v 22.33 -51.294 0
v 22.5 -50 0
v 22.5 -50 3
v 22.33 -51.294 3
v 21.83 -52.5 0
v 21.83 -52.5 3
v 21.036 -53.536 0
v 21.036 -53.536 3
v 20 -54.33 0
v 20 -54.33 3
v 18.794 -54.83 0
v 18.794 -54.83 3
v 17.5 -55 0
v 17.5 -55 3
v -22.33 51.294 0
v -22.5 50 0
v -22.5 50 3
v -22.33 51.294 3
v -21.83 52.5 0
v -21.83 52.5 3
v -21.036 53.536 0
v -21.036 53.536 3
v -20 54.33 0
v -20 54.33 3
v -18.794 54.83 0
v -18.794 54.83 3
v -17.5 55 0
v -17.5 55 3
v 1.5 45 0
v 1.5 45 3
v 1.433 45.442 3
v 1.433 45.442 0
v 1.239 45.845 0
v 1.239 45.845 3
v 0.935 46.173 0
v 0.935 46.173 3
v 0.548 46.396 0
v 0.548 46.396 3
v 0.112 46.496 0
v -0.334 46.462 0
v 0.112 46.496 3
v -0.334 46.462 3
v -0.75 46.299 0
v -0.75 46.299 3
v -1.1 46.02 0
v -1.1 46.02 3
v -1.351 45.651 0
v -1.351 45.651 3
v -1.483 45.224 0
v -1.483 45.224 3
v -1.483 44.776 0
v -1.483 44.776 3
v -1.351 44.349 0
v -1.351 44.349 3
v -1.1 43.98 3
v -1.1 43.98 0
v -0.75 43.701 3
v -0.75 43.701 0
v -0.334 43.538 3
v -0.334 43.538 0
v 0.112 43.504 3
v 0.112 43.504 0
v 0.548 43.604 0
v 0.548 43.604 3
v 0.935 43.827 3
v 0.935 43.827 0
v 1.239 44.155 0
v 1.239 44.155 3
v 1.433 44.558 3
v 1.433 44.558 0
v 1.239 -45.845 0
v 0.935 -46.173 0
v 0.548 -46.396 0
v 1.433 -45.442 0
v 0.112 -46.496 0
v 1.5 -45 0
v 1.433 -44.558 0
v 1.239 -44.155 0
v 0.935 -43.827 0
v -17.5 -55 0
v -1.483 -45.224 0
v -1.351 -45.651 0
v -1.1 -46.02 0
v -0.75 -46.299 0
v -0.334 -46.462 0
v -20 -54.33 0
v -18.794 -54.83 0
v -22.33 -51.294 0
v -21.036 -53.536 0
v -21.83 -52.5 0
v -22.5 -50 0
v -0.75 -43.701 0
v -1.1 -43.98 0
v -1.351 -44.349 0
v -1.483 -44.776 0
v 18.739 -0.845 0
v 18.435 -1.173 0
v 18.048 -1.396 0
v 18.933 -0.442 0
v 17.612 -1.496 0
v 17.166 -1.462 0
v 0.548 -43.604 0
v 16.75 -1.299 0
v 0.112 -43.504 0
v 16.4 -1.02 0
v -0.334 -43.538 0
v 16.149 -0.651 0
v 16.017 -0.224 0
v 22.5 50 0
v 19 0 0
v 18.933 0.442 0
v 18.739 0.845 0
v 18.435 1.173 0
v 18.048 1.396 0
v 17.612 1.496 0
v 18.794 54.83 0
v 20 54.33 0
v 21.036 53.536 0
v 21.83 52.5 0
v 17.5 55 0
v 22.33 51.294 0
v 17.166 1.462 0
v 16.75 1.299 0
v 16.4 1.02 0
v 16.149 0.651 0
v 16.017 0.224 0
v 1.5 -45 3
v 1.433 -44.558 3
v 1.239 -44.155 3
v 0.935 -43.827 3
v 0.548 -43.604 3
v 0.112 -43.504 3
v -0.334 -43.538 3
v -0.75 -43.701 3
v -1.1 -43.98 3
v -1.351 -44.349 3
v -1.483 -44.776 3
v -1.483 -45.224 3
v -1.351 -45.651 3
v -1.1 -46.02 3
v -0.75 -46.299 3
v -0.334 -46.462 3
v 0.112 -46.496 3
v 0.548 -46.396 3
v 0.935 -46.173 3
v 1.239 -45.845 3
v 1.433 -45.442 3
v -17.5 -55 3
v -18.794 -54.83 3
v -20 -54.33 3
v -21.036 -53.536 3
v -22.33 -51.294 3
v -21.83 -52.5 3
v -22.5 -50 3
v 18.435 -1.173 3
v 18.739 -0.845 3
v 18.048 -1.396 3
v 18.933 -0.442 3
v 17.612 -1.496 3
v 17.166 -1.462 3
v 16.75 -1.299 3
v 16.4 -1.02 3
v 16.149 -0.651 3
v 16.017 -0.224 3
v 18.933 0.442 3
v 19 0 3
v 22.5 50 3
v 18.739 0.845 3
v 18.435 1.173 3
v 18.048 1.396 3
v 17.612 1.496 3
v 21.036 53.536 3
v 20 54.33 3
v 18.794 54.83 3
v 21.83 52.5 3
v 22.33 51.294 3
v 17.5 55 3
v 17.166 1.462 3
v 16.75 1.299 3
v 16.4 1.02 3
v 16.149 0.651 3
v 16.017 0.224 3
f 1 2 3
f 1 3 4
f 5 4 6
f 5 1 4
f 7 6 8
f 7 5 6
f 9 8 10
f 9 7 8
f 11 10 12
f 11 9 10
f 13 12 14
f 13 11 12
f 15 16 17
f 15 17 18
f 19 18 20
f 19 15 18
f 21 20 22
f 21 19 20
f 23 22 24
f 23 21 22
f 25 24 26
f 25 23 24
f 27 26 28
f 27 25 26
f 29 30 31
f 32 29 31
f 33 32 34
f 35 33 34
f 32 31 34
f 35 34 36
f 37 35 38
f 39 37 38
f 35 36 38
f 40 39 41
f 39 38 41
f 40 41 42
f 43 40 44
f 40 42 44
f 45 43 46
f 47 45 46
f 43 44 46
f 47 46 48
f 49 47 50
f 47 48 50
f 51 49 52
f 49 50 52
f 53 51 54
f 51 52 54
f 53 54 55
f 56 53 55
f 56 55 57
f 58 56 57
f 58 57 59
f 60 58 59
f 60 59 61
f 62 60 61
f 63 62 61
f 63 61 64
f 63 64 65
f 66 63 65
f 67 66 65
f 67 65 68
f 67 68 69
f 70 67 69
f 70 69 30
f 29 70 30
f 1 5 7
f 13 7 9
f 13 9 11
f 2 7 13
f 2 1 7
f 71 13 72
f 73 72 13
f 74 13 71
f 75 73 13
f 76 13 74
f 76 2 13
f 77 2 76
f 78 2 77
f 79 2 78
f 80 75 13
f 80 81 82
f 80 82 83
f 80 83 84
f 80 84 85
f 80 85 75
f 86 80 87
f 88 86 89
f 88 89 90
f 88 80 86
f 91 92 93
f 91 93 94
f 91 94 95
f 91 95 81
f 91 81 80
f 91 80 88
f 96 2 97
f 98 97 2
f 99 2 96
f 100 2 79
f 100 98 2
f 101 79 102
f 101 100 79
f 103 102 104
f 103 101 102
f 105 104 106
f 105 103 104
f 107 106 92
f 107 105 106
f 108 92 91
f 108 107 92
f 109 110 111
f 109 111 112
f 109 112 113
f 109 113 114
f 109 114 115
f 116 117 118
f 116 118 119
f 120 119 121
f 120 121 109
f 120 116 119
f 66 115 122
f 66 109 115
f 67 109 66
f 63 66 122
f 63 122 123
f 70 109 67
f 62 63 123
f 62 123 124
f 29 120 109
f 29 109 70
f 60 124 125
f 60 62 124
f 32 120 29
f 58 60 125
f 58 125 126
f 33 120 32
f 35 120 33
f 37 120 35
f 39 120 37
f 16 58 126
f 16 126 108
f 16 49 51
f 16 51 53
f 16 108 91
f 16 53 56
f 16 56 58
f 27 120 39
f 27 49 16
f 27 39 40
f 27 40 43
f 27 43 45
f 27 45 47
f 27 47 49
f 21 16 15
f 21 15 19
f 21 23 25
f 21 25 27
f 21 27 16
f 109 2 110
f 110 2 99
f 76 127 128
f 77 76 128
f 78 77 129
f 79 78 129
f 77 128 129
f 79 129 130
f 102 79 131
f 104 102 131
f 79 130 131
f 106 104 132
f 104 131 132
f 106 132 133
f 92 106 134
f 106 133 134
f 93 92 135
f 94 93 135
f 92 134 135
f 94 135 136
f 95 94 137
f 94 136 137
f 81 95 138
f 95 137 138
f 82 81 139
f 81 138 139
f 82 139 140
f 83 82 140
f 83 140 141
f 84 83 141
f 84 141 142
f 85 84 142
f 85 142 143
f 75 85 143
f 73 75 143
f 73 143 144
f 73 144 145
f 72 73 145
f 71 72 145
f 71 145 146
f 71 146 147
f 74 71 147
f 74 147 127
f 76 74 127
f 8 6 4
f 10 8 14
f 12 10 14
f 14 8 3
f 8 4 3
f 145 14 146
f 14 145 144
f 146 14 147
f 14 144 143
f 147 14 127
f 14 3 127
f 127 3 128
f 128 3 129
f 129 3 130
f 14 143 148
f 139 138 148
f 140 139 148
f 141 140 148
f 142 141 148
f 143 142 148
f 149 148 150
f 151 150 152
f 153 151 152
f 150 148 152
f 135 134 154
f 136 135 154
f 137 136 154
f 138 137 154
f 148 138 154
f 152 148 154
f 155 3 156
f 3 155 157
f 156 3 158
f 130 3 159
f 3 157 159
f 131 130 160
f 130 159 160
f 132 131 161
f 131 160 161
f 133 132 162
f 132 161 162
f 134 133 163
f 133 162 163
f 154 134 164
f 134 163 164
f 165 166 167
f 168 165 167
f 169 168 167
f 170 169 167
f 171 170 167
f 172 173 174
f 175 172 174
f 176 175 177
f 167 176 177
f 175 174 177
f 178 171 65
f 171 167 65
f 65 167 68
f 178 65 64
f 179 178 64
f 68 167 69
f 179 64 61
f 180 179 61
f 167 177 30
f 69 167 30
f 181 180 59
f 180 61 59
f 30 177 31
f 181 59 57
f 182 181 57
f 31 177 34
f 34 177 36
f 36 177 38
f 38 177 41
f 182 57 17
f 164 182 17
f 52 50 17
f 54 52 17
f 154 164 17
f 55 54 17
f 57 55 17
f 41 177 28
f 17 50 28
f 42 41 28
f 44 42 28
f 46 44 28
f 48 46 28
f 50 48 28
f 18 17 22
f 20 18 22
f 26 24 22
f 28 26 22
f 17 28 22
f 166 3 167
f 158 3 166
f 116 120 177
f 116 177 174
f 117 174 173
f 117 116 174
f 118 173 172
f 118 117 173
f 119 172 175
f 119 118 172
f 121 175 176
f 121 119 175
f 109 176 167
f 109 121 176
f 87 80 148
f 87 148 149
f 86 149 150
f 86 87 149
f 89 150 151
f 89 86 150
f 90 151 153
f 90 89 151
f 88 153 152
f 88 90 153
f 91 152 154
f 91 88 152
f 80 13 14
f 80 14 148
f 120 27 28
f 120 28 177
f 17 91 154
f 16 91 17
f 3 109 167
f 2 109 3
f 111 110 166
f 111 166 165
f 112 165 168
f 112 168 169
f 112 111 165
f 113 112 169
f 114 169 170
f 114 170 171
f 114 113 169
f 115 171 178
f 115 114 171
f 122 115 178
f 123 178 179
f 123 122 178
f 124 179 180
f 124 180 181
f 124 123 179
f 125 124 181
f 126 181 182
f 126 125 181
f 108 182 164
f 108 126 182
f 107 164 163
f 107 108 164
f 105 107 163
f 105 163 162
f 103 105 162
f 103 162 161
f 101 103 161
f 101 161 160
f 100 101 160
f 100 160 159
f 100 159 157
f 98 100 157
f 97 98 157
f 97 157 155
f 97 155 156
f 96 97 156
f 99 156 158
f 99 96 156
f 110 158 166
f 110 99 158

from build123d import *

# Parameters (mm, degrees)
SKETCH1_R           = 1.5
BOSS_EXTRUDE1_DEPTH = 3
SKETCH4_R           = 1.5
CUT_EXTRUDE1_DEPTH  = 60.5


with BuildPart() as part:
    # Sketch1 → Boss-Extrude1 (new body)
    with BuildSketch(Plane.XY):
        with BuildLine():
            Line((-17.5, 55), (17.5, 55))
            ThreePointArc((17.5, 55), (21.035533906, 53.535533906), (22.5, 50))
            Line((22.5, 50), (22.5, -50))
            ThreePointArc((22.5, -50), (21.035533906, -53.535533906), (17.5, -55))
            Line((17.5, -55), (-17.5, -55))
            ThreePointArc((-17.5, -55), (-21.035533906, -53.535533906), (-22.5, -50))
            Line((-22.5, -50), (-22.5, 50))
            ThreePointArc((-22.5, 50), (-21.035533906, 53.535533906), (-17.5, 55))
        make_face()
        with Locations((17.5, 0)):
            Circle(SKETCH1_R, mode=Mode.SUBTRACT)
    extrude(amount=BOSS_EXTRUDE1_DEPTH)

    # Sketch4 → Cut-Extrude1 (cut, through all)
    with BuildSketch(Plane.XY.offset(3)):
        with Locations((0, 45)):
            Circle(SKETCH4_R)
        with Locations((0, -45)):
            Circle(SKETCH4_R)
    extrude(amount=-CUT_EXTRUDE1_DEPTH, mode=Mode.SUBTRACT)


solid = part.part
